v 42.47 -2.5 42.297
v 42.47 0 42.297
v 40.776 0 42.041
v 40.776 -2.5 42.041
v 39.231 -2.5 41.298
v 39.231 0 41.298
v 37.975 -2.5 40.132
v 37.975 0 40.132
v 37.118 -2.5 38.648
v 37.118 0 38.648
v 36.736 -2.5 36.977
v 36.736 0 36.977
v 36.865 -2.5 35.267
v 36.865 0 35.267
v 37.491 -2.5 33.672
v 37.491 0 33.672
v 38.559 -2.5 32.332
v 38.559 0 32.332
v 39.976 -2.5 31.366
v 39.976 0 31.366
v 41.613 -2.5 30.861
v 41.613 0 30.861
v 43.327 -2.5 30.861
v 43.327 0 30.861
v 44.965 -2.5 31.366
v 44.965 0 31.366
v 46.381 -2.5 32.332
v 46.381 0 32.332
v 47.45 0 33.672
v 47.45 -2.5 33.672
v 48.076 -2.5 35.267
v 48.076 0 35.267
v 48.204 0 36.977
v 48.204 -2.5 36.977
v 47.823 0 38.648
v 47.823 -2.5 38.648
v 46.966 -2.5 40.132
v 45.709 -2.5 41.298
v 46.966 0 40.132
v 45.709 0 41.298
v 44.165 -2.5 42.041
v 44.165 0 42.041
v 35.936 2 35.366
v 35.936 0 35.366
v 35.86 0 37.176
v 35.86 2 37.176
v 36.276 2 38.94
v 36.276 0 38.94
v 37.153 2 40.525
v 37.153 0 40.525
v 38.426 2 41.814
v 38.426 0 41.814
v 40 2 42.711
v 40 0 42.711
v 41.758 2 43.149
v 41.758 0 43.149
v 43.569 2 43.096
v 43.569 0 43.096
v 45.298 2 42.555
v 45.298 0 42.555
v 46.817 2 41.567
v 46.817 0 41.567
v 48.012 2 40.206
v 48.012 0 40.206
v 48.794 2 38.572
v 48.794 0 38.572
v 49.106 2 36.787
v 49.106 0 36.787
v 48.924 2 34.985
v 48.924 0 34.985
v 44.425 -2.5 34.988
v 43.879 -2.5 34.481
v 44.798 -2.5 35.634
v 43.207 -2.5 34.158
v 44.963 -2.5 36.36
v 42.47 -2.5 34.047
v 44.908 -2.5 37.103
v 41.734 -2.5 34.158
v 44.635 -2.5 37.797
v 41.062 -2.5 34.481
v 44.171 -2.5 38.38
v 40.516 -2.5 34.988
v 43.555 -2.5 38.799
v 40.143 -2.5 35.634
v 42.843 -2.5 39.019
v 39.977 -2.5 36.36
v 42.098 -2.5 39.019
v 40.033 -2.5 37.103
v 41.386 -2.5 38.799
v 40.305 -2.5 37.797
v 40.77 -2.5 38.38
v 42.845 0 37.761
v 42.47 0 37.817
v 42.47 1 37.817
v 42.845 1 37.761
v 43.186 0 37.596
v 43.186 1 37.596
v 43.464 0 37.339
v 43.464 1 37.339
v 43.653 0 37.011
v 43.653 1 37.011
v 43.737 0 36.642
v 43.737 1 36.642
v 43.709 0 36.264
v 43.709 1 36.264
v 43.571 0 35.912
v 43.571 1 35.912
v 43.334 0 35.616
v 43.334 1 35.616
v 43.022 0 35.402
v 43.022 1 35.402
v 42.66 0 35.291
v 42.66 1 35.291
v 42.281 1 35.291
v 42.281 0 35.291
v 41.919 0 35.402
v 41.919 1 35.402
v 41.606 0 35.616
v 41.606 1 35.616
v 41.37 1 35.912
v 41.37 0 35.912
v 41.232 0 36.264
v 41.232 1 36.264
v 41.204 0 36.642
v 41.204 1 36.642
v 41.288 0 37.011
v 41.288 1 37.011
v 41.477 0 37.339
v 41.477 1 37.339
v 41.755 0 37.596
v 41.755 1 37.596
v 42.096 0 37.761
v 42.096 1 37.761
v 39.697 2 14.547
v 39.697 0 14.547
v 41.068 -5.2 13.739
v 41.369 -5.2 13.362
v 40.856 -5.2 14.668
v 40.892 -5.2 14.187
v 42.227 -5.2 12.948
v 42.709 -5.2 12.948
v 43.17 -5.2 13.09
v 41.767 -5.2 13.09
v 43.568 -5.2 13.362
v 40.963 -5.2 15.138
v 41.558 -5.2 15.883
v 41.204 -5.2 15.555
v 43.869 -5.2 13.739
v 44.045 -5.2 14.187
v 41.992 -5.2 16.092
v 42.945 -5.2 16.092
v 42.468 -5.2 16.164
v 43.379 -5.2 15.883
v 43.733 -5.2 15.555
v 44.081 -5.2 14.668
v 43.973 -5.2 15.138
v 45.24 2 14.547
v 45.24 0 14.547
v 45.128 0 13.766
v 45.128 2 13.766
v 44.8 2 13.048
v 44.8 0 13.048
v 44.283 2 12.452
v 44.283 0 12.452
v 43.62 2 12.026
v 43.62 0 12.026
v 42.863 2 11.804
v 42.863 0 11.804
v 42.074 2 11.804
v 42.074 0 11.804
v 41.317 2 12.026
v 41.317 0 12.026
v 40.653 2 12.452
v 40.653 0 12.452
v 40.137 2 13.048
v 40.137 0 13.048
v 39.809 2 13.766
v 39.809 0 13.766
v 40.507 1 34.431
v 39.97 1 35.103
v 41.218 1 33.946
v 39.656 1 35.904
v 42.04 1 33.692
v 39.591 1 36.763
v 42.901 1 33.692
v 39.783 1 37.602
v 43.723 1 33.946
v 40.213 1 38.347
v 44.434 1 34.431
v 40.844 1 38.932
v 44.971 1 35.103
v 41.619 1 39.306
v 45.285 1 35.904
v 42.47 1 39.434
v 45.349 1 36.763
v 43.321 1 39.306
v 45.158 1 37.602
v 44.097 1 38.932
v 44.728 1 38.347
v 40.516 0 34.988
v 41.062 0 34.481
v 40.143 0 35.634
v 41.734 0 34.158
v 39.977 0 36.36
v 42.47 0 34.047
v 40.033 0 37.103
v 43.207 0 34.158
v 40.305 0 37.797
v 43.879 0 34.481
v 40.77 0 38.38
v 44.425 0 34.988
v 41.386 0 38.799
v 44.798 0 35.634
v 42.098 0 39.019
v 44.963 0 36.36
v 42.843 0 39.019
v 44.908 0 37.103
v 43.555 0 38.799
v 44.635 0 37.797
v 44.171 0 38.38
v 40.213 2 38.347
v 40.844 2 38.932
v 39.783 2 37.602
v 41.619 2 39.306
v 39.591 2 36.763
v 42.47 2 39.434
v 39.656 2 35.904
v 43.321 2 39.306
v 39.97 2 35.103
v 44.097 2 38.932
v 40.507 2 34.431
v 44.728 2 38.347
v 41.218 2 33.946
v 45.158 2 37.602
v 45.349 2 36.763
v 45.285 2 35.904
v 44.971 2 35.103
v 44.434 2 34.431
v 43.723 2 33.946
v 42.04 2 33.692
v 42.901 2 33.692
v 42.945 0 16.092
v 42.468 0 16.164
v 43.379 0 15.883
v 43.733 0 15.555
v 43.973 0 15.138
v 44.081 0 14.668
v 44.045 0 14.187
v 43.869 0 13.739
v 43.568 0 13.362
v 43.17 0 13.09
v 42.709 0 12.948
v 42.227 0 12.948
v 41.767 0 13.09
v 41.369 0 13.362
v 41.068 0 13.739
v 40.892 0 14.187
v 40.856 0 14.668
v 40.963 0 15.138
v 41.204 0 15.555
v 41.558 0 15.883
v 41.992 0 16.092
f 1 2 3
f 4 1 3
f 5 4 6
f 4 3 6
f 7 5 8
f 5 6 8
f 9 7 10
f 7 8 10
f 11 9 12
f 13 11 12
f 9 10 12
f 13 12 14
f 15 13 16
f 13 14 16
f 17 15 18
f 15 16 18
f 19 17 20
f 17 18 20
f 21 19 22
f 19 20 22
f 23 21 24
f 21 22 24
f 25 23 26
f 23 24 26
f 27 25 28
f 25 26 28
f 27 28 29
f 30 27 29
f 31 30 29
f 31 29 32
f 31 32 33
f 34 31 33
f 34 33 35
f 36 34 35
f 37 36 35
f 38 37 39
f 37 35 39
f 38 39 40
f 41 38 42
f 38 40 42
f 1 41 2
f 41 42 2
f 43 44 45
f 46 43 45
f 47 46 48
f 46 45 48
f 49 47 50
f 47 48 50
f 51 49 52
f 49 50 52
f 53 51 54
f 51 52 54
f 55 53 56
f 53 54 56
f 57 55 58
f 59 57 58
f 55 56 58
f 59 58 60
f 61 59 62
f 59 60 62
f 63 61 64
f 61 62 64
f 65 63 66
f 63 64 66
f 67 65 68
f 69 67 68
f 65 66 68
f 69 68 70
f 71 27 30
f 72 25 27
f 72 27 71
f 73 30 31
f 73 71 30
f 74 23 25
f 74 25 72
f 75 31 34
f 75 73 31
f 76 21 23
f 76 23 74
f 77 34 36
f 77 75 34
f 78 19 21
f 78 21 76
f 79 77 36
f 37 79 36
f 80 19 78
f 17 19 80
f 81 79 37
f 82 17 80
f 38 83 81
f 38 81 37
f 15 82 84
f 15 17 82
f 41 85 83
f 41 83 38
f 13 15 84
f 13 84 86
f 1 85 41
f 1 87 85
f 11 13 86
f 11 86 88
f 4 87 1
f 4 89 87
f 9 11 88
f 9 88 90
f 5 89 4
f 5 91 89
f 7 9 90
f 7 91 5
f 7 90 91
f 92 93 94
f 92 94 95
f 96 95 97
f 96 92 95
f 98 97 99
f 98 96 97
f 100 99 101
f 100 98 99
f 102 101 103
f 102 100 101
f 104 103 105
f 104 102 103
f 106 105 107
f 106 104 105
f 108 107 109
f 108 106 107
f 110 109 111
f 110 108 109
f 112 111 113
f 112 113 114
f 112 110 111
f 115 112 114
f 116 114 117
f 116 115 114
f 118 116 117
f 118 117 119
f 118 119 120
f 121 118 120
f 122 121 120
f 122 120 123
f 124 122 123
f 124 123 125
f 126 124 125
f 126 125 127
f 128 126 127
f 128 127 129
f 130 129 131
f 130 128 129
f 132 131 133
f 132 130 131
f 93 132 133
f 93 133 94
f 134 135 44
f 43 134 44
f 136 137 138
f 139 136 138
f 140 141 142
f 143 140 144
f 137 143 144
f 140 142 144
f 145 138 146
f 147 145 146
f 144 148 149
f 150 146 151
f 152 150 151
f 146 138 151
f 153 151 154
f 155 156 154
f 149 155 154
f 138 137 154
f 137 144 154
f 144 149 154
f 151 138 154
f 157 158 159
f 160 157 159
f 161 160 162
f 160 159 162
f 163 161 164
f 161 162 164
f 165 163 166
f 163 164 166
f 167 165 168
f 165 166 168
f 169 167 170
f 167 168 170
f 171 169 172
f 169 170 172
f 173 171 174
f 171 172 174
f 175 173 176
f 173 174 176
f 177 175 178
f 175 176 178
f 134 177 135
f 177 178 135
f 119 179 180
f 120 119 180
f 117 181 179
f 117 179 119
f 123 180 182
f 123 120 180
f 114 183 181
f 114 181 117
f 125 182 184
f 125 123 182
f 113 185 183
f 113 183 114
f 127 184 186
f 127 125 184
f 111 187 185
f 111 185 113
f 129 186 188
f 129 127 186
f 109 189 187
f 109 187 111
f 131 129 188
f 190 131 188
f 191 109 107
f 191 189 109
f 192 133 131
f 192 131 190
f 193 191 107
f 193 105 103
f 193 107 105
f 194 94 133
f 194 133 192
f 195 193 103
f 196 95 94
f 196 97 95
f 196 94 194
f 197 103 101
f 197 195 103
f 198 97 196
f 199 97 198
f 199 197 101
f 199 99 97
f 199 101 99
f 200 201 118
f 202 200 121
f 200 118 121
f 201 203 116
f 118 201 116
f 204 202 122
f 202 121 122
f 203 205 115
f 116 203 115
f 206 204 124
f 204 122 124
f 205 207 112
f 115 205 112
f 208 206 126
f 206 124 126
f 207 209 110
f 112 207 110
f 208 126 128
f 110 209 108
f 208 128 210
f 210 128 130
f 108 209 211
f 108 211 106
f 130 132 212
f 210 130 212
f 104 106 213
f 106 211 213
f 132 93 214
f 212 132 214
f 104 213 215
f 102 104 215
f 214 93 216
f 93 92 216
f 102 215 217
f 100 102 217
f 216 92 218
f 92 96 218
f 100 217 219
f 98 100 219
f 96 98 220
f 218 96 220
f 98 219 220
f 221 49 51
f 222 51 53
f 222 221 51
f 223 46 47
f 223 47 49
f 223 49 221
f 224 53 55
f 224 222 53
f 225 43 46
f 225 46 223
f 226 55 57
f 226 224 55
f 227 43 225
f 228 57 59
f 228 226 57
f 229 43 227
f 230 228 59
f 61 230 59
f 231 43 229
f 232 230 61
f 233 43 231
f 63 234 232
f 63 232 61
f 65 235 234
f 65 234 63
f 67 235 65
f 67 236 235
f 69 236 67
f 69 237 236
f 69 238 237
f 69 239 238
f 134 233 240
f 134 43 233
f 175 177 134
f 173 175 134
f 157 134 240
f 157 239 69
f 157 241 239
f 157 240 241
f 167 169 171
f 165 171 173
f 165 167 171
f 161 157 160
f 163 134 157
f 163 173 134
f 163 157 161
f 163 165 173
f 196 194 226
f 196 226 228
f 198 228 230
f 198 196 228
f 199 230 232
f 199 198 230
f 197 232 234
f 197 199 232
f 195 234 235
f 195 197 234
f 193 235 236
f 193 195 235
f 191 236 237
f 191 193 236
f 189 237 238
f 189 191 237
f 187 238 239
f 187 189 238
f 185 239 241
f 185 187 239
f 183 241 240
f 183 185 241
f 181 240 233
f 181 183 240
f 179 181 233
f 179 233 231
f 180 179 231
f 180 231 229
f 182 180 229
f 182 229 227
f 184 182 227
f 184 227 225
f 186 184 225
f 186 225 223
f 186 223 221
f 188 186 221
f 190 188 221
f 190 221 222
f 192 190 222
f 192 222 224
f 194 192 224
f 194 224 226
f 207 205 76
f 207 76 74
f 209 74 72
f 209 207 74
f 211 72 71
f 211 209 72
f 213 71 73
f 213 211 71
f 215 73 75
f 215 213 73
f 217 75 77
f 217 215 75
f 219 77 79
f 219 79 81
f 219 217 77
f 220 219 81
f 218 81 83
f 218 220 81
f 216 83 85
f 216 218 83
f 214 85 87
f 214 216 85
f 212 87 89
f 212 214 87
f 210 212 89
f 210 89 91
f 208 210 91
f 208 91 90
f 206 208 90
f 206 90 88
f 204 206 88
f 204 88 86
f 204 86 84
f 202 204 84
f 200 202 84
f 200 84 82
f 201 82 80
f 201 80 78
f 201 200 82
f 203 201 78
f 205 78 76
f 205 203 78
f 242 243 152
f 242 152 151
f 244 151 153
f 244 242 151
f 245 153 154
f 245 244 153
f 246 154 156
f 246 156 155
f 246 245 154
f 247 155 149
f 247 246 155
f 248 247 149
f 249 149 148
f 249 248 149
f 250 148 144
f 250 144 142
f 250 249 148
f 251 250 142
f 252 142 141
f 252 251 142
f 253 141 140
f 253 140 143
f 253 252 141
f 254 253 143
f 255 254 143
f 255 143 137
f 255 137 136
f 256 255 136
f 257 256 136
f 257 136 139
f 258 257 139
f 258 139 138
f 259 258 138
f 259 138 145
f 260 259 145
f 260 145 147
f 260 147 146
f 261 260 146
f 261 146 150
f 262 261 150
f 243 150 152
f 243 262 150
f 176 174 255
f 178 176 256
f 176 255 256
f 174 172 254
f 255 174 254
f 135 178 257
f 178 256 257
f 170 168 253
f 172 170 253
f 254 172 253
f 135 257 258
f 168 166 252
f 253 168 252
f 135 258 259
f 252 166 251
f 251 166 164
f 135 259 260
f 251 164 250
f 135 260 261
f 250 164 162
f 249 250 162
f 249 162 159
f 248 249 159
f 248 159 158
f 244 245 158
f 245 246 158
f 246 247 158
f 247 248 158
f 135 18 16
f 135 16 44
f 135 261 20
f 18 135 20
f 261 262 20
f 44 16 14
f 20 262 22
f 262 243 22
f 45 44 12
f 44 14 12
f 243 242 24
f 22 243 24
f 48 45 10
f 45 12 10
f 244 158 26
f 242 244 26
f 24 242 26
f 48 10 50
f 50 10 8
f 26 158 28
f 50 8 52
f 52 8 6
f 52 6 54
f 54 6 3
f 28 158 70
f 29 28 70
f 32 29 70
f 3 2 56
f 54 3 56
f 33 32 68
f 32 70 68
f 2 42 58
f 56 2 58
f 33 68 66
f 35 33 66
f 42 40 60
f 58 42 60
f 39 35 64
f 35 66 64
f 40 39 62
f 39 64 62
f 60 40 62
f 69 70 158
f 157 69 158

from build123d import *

# Parameters (mm, degrees)
SKETCH1_R           = 2.887093213
BOSS_EXTRUDE1_DEPTH = 2
SKETCH1_4_R         = 2.887093213
SKETCH1_4_R_2       = 1.270321014
BOSS_EXTRUDE2_DEPTH = 1
SKETCH1_6_R         = 1.616772199
BOSS_EXTRUDE5_DEPTH = 5.2
SKETCH3_R           = 5.75
SKETCH3_R_2         = 2.5
BOSS_EXTRUDE6_DEPTH = 2.5


with BuildPart() as part:
    # Sketch1 → Boss-Extrude1 (new body)
    with BuildSketch(Plane(origin=(0, 0, 0), x_dir=(1, 0, 0), z_dir=(0, 1, 0))):
        with BuildLine():
            Line((48.924361083, -34.984798737), (45.240075768, -14.546907598))
            ThreePointArc((45.240075768, -14.546907598), (42.468466284, -11.775298114), (39.6968568, -14.546907598))
            Line((39.6968568, -14.546907598), (35.935854194, -35.366456871))
            ThreePointArc((35.935854194, -35.366456871), (42.66543851, -43.184357012), (48.924361083, -34.984798737))
        make_face()
        with Locations((42.470401728, -36.546907513)):
            Circle(SKETCH1_R, mode=Mode.SUBTRACT)
    extrude(amount=BOSS_EXTRUDE1_DEPTH)

    # Sketch1<4> → Boss-Extrude2 (add)
    with BuildSketch(Plane(origin=(0, 0, 0), x_dir=(1, 0, 0), z_dir=(0, 1, 0))):
        with Locations((42.470401728, -36.546907513)):
            Circle(SKETCH1_4_R)
        with Locations((42.470401728, -36.546907513)):
            Circle(SKETCH1_4_R_2, mode=Mode.SUBTRACT)
    extrude(amount=BOSS_EXTRUDE2_DEPTH)

    # Sketch1<6> → Boss-Extrude5 (add)
    with BuildSketch(Plane(origin=(0, 0, 0), x_dir=(1, 0, 0), z_dir=(0, 1, 0))):
        with Locations((42.468466284, -14.546907598)):
            Circle(SKETCH1_6_R)
    extrude(amount=-BOSS_EXTRUDE5_DEPTH)

    # Sketch3 → Boss-Extrude6 (add)
    with BuildSketch(Plane.XZ):
        with Locations((42.470401728, 36.546907513)):
            Circle(SKETCH3_R)
        with Locations((42.470401728, 36.546907513)):
            Circle(SKETCH3_R_2, mode=Mode.SUBTRACT)
    extrude(amount=BOSS_EXTRUDE6_DEPTH)


solid = part.part
